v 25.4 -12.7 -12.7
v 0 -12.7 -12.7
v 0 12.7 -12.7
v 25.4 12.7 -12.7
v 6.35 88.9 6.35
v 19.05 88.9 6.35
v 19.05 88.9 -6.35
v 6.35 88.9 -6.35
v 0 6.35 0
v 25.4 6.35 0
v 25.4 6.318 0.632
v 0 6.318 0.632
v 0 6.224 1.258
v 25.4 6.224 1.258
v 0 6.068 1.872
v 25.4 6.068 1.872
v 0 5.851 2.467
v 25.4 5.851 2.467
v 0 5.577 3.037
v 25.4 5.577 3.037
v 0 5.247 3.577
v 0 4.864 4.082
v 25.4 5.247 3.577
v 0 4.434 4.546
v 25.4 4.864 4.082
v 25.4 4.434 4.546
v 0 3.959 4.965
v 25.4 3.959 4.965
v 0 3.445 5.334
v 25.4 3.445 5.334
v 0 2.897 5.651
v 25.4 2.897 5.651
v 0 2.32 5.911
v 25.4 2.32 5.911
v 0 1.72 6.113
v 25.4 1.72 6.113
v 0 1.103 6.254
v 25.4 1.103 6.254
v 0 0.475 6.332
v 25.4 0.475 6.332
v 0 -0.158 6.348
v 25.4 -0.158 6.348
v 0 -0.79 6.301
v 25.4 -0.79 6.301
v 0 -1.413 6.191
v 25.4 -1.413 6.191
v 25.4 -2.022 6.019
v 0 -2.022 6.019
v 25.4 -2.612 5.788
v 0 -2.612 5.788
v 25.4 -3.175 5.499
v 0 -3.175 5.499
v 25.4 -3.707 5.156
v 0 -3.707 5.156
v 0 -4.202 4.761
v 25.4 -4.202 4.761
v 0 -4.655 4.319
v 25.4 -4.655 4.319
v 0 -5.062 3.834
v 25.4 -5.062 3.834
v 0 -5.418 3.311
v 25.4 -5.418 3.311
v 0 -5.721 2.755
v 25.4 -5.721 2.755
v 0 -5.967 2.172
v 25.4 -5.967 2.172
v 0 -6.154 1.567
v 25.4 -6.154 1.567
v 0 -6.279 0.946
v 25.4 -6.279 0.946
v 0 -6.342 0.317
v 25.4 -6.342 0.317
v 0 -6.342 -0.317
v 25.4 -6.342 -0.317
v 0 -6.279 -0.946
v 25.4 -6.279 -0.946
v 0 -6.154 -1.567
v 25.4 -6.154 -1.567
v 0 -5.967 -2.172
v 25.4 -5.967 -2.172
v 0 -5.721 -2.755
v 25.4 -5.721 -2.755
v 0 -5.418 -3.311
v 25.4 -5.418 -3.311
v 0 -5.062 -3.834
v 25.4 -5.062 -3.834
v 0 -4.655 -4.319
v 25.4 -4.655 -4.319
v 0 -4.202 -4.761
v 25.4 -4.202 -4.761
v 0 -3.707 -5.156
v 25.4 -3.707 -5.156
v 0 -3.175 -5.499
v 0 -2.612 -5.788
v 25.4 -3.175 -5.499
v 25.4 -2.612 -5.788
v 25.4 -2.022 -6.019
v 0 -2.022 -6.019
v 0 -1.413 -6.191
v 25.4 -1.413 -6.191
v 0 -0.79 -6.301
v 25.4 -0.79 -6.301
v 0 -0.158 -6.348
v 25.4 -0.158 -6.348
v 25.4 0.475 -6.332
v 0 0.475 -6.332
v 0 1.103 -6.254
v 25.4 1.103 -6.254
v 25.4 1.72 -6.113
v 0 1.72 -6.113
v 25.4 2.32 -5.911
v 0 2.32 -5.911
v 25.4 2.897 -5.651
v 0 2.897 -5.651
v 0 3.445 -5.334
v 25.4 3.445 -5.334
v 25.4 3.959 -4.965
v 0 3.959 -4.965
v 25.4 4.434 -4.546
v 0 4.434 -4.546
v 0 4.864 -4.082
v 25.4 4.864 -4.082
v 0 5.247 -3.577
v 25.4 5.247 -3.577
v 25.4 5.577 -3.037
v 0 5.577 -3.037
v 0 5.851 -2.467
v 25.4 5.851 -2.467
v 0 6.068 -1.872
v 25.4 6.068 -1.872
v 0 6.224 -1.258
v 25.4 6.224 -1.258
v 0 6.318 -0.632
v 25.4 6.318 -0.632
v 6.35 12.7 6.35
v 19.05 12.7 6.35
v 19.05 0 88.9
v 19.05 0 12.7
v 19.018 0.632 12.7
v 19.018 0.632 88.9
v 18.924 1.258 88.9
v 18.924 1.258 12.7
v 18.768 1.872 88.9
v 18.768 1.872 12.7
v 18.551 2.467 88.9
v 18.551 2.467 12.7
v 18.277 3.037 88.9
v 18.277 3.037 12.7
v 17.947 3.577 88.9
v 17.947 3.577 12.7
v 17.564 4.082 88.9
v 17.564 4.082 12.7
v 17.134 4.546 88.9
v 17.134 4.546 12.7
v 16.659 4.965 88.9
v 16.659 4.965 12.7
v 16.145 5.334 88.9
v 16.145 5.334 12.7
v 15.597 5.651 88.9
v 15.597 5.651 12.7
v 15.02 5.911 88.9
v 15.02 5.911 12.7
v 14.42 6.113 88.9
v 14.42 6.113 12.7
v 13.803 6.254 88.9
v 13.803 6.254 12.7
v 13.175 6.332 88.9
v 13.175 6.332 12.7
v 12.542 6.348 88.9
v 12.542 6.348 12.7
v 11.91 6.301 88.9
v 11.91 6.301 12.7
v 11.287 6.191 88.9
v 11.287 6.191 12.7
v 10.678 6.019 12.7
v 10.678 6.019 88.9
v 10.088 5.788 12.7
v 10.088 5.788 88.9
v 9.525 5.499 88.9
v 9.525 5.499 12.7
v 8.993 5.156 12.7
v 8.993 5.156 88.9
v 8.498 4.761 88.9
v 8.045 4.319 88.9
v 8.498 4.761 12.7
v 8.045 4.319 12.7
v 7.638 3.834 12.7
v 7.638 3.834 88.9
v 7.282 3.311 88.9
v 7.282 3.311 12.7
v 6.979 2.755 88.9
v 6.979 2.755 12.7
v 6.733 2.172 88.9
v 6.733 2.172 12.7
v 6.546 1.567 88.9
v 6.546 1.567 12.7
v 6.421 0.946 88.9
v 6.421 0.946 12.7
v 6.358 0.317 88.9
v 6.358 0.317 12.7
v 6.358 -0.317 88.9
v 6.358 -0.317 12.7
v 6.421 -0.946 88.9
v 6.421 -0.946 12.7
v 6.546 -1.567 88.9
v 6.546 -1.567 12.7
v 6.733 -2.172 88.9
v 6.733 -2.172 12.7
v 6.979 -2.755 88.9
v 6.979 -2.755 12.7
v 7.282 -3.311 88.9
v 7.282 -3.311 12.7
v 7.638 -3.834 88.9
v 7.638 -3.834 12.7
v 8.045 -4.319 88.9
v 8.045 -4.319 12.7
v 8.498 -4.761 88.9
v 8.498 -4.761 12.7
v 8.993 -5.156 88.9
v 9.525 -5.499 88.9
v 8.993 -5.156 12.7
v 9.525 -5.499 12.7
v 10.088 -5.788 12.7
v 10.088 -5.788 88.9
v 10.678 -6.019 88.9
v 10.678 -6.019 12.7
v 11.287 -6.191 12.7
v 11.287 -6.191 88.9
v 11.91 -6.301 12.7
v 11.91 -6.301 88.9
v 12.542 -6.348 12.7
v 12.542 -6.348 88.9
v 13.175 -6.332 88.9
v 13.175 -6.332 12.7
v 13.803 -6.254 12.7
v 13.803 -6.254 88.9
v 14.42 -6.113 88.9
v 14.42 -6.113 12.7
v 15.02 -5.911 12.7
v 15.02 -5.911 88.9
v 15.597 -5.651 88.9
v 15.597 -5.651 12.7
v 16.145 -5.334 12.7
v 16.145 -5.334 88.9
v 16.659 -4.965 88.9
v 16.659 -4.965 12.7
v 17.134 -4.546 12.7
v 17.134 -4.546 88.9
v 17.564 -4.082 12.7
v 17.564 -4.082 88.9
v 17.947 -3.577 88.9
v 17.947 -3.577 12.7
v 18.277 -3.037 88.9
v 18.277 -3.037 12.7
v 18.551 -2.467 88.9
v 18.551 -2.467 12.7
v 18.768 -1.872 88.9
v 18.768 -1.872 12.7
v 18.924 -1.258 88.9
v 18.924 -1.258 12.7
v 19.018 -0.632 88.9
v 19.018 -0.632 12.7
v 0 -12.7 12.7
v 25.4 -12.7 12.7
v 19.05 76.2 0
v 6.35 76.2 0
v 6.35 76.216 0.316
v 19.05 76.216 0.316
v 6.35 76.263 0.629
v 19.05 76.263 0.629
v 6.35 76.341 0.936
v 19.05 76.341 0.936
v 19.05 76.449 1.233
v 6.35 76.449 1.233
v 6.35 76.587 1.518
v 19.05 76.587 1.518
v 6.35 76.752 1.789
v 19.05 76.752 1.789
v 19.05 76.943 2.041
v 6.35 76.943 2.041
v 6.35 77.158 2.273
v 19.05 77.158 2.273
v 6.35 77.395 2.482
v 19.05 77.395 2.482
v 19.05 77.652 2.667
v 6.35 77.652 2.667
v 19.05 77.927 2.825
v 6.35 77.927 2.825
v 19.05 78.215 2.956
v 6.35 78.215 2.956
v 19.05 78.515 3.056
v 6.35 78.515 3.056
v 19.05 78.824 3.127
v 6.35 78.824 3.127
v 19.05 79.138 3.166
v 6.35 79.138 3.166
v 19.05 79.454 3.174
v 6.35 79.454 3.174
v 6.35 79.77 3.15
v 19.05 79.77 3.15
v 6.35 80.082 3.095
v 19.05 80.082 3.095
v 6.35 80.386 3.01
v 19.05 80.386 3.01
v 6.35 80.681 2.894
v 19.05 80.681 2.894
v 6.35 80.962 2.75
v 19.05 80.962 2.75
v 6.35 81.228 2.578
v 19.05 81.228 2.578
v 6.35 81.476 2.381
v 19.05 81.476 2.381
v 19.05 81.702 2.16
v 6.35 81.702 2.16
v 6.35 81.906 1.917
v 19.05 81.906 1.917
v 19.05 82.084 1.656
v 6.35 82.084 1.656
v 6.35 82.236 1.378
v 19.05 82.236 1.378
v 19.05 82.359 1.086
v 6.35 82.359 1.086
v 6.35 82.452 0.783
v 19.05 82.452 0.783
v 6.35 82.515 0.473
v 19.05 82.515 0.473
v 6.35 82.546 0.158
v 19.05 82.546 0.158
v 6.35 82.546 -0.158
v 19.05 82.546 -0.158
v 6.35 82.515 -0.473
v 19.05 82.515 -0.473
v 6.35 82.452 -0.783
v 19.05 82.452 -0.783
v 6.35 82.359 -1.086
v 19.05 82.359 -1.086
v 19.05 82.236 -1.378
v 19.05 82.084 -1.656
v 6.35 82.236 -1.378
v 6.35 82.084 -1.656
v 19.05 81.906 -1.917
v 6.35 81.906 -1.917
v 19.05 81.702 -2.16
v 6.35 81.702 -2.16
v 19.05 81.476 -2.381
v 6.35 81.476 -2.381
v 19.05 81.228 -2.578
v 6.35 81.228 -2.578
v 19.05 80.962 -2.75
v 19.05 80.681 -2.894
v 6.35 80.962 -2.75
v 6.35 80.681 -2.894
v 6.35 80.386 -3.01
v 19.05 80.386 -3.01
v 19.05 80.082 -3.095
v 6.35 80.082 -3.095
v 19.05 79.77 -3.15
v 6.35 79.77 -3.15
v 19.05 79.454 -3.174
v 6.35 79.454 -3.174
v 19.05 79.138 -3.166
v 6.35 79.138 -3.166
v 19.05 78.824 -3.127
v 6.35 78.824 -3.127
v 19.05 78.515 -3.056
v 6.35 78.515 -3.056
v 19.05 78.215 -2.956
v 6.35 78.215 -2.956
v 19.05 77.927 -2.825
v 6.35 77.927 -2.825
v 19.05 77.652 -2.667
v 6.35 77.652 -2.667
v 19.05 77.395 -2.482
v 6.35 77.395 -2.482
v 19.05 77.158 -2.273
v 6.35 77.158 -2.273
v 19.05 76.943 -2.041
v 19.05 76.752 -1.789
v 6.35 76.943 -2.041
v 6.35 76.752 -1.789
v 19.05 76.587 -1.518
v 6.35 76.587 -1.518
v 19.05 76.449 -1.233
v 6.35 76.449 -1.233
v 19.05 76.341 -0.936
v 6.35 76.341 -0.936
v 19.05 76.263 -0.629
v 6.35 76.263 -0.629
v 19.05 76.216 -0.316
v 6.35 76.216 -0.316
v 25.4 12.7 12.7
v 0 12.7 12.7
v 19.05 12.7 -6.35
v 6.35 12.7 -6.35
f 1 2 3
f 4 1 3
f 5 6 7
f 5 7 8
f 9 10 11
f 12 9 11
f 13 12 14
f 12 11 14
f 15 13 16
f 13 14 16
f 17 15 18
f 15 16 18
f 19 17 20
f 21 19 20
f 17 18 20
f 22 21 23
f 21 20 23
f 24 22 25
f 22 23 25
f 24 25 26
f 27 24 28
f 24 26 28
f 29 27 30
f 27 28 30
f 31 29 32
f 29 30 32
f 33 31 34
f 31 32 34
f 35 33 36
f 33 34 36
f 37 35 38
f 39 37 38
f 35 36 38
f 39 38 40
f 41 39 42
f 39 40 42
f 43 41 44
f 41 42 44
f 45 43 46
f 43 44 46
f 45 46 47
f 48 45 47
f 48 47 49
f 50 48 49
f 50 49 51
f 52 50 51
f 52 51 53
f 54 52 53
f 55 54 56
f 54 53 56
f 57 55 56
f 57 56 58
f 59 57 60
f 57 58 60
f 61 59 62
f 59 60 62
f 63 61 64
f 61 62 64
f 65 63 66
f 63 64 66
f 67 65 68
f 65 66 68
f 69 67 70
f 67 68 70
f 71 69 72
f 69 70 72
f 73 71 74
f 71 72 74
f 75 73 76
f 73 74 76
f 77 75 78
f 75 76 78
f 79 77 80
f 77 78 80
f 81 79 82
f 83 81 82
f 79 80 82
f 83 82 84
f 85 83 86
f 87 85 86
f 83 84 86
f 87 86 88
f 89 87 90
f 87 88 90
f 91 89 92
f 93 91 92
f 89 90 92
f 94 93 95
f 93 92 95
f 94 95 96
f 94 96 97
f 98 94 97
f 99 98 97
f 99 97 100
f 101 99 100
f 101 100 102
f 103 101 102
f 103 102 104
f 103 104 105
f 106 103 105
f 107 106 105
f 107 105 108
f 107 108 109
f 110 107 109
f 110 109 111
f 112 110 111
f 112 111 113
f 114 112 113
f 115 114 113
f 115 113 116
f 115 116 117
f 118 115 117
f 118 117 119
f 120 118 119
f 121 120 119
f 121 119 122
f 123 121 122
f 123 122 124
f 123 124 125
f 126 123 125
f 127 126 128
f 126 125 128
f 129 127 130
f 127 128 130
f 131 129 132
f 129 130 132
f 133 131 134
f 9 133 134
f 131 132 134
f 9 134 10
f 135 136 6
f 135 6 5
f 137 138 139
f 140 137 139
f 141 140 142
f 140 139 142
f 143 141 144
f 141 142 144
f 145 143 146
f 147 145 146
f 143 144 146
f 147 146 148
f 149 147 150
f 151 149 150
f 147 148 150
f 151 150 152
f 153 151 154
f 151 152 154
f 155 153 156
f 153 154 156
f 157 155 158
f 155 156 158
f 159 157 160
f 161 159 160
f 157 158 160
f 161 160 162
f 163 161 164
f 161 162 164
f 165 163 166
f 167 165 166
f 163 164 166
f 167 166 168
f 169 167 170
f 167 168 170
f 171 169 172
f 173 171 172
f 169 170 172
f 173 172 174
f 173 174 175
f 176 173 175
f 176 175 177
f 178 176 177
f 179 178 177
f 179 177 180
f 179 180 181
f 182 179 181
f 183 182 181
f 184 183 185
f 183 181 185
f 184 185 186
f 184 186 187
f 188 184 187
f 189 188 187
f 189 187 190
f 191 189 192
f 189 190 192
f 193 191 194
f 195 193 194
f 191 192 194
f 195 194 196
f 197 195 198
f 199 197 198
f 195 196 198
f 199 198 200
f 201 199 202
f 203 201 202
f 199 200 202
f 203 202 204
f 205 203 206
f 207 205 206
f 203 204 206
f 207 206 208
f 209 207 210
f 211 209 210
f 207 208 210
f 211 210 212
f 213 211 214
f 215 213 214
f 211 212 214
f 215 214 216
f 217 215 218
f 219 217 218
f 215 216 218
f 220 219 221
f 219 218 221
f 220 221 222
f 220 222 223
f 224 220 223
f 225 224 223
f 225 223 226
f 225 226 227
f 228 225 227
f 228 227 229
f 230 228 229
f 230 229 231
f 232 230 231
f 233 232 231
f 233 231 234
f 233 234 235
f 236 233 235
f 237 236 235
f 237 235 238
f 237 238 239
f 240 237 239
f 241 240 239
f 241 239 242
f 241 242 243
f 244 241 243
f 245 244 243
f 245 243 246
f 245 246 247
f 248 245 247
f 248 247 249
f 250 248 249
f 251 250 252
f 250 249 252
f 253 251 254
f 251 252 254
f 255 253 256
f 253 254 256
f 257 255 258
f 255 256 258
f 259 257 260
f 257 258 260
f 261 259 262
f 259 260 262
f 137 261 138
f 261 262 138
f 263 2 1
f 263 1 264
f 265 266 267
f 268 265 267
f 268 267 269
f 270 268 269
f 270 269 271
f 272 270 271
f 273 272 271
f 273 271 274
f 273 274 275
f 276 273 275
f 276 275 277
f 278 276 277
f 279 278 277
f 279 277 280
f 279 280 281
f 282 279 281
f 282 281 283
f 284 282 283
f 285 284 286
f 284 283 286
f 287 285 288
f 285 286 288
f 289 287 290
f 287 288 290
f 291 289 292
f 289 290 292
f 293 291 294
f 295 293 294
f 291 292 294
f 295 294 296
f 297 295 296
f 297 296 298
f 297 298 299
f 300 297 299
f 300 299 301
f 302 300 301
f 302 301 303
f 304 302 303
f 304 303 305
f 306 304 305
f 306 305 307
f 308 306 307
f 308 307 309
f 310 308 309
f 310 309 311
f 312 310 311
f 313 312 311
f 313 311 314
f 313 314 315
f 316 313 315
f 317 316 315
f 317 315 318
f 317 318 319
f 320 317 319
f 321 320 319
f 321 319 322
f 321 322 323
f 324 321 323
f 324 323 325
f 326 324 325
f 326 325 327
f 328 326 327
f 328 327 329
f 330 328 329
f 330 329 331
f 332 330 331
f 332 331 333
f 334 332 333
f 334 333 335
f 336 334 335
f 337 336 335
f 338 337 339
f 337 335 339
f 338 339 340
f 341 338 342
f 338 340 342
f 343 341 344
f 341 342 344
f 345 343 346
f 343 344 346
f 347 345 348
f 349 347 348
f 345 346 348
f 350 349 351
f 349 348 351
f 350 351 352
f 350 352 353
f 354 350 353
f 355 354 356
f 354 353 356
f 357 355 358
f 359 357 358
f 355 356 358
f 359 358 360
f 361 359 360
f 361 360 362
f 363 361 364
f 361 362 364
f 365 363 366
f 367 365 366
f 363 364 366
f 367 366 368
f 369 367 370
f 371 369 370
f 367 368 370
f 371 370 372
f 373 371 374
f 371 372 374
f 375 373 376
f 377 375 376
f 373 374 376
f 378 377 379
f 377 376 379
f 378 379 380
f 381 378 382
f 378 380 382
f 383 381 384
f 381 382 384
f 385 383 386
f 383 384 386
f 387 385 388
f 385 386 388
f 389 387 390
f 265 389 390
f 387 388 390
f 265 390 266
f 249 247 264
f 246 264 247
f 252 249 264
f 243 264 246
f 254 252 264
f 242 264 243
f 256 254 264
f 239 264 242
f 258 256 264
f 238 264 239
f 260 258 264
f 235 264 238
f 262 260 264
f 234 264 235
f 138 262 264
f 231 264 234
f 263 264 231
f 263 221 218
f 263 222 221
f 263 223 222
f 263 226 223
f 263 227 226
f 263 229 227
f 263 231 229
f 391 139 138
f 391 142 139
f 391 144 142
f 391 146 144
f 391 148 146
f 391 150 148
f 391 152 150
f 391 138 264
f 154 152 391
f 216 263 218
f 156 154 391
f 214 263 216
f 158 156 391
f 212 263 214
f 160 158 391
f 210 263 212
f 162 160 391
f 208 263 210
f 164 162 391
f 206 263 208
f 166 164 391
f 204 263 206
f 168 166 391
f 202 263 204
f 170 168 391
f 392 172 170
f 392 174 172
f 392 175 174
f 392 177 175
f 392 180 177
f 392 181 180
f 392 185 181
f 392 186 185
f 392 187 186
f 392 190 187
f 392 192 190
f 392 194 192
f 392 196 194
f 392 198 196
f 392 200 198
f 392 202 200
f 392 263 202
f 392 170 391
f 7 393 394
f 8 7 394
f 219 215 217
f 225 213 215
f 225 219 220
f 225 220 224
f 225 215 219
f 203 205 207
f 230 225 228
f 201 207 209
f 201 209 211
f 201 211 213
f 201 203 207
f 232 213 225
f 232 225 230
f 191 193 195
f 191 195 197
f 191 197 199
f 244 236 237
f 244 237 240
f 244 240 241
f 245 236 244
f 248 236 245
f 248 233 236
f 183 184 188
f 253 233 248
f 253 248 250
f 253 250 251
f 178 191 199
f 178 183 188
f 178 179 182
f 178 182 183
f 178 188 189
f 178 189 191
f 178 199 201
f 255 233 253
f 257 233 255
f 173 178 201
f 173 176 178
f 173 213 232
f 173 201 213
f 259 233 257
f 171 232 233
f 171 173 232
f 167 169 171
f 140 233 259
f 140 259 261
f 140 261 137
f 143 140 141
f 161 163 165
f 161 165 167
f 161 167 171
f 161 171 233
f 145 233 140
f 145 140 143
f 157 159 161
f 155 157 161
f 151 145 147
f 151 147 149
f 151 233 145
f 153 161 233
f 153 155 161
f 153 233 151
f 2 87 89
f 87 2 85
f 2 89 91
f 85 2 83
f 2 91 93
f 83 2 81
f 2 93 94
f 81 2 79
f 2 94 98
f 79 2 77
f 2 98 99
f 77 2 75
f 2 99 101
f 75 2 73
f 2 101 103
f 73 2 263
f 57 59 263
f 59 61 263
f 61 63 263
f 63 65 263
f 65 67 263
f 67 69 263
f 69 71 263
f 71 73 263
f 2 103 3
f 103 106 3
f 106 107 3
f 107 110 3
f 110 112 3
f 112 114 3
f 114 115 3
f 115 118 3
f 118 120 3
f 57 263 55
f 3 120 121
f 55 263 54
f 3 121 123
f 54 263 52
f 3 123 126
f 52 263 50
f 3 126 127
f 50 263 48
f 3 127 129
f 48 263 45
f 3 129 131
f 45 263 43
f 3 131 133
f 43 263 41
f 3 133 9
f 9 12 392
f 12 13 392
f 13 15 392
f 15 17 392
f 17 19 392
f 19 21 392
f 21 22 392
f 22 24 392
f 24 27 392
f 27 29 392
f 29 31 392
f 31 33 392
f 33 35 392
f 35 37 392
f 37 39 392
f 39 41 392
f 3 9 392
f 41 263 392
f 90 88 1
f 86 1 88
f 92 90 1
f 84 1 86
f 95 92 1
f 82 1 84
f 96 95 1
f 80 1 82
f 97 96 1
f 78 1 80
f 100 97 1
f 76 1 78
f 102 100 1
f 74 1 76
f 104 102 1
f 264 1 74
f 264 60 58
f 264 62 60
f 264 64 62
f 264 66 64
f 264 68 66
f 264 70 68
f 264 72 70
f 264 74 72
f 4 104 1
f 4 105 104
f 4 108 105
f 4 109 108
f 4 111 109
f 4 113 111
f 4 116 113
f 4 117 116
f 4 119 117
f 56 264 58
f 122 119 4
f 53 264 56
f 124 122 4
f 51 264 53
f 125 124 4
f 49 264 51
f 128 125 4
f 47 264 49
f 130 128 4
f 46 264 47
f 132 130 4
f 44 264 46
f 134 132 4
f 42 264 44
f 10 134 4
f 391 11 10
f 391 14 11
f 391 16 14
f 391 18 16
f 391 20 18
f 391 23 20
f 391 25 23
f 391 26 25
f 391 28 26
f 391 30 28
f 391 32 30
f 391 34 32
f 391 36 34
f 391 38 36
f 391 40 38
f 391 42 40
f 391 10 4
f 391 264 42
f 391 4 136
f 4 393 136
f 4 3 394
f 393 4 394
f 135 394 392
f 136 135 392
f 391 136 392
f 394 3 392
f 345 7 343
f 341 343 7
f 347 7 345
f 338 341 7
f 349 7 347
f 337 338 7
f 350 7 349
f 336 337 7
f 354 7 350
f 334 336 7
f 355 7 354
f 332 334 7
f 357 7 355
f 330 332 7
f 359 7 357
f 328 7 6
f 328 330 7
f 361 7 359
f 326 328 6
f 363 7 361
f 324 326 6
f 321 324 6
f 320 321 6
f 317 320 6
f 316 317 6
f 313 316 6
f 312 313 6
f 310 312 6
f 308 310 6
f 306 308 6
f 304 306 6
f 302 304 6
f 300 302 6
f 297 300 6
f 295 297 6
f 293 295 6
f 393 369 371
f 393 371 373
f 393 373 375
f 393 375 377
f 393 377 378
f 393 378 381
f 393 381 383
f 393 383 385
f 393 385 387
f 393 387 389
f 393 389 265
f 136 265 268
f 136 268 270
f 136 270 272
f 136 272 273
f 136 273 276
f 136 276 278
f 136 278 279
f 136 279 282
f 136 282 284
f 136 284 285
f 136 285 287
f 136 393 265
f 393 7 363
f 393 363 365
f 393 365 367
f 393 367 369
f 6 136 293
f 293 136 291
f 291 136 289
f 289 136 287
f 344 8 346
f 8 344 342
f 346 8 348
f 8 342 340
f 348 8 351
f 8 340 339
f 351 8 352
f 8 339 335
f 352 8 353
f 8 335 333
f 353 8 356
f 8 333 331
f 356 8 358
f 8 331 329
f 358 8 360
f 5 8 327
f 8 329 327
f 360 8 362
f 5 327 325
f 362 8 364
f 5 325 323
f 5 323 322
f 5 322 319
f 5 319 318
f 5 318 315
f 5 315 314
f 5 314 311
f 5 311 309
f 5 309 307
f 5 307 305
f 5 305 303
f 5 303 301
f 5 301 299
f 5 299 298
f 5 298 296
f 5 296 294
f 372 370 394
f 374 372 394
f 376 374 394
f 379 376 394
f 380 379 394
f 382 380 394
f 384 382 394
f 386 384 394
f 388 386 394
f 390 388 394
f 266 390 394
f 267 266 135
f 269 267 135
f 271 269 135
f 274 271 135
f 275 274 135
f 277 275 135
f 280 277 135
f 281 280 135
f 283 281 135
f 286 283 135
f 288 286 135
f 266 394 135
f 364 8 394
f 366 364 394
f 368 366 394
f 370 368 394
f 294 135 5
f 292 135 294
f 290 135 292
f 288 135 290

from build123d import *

# Parameters (mm, degrees)
F0_W     = 25.4
F0_H     = 25.4
F1_DEPTH = 25.4
F2_R     = 6.35
F3_DEPTH = 25.4
F4_R     = 6.35
F5_DEPTH = 76.2
F6_W     = 12.7
F6_H     = 12.7
F7_DEPTH = 76.2
F8_R     = 3.175
F9_DEPTH = 25.4


with BuildPart() as f1:
    # F0 (on Right) → F1 (new body)
    with BuildSketch(Plane.YZ):
        Rectangle(F0_W, F0_H)
    extrude(amount=F1_DEPTH)

    # F2 (on face) → F3 (cut)
    with BuildSketch(Plane.YZ.offset(25.4)):
        Circle(F2_R)
    extrude(amount=-F3_DEPTH, mode=Mode.SUBTRACT)

    # F4 (on face) → F5 (join)
    with BuildSketch(Plane.XY.offset(12.7)):
        with Locations((12.7, 0)):
            Circle(F4_R)
    extrude(amount=F5_DEPTH)

    # F6 (on face) → F7 (join)
    with BuildSketch(Plane(origin=(0, 12.7, 0), x_dir=(-1, 0, 0), z_dir=(0, 1, 0))):
        with Locations((-12.7, 0)):
            Rectangle(F6_W, F6_H)
    extrude(amount=F7_DEPTH)

    # F8 (on face) → F9 (cut)
    with BuildSketch(Plane(origin=(6.35, 0, 0), x_dir=(0, -1, 0), z_dir=(-1, 0, 0))):
        with Locations((-79.375, 0)):
            Circle(F8_R)
    extrude(amount=-F9_DEPTH, mode=Mode.SUBTRACT)


solid = f1.part
